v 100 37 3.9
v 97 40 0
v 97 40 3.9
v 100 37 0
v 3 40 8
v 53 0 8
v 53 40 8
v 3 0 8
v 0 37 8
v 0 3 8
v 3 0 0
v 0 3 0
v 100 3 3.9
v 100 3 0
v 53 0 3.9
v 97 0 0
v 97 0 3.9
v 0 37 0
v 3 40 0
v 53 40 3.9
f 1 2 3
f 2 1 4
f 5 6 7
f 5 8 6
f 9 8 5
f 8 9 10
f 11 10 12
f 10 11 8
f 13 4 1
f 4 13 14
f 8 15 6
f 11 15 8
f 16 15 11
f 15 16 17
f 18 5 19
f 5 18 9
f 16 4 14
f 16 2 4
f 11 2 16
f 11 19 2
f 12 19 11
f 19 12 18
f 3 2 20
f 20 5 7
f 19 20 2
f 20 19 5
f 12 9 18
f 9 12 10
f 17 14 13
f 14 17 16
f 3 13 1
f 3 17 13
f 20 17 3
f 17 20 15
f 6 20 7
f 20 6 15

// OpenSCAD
$fn = 32;

// ----------------------------------------------------------------------
// Stepped bar: endstep, 100 x 40 x 8/3.9 mm
// ----------------------------------------------------------------------

// --- parameters (mm) ---
bar_l = 100;              // bar length, X
bar_w = 40;               // bar width, Y
plate_t = 8;              // thickness of the thick zone, Z
thin_t = 3.9;             // thickness of the thin zone
corner_c = 3;             // corner chamfer of the bar
step_cut = 4.1;           // material removed from the thin zone
step_x = 53;              // step position from the left end
depth_1 = 4.1;            // depth of cut 1 from the top face
fit_tol = 0.02;           // declared fit tolerance (prompt contract)
free_tol = 0.2;           // declared free tolerance (prompt contract)

profile = [[3, 0], [97, 0], [100, 3], [100, 37], [97, 40], [3, 40], [0, 37], [0, 3]];  // primary outline, 8 points, counter clockwise
void_1 = [[53, -1], [101, -1], [101, 41], [53, 41]];  // thin zone beyond the step, 4 points

// --- the one profile operation ---
difference() {
  linear_extrude(height = plate_t) polygon(points = profile);
  translate([0, 0, plate_t - depth_1])
    linear_extrude(height = depth_1 + 1) polygon(points = void_1);
}
